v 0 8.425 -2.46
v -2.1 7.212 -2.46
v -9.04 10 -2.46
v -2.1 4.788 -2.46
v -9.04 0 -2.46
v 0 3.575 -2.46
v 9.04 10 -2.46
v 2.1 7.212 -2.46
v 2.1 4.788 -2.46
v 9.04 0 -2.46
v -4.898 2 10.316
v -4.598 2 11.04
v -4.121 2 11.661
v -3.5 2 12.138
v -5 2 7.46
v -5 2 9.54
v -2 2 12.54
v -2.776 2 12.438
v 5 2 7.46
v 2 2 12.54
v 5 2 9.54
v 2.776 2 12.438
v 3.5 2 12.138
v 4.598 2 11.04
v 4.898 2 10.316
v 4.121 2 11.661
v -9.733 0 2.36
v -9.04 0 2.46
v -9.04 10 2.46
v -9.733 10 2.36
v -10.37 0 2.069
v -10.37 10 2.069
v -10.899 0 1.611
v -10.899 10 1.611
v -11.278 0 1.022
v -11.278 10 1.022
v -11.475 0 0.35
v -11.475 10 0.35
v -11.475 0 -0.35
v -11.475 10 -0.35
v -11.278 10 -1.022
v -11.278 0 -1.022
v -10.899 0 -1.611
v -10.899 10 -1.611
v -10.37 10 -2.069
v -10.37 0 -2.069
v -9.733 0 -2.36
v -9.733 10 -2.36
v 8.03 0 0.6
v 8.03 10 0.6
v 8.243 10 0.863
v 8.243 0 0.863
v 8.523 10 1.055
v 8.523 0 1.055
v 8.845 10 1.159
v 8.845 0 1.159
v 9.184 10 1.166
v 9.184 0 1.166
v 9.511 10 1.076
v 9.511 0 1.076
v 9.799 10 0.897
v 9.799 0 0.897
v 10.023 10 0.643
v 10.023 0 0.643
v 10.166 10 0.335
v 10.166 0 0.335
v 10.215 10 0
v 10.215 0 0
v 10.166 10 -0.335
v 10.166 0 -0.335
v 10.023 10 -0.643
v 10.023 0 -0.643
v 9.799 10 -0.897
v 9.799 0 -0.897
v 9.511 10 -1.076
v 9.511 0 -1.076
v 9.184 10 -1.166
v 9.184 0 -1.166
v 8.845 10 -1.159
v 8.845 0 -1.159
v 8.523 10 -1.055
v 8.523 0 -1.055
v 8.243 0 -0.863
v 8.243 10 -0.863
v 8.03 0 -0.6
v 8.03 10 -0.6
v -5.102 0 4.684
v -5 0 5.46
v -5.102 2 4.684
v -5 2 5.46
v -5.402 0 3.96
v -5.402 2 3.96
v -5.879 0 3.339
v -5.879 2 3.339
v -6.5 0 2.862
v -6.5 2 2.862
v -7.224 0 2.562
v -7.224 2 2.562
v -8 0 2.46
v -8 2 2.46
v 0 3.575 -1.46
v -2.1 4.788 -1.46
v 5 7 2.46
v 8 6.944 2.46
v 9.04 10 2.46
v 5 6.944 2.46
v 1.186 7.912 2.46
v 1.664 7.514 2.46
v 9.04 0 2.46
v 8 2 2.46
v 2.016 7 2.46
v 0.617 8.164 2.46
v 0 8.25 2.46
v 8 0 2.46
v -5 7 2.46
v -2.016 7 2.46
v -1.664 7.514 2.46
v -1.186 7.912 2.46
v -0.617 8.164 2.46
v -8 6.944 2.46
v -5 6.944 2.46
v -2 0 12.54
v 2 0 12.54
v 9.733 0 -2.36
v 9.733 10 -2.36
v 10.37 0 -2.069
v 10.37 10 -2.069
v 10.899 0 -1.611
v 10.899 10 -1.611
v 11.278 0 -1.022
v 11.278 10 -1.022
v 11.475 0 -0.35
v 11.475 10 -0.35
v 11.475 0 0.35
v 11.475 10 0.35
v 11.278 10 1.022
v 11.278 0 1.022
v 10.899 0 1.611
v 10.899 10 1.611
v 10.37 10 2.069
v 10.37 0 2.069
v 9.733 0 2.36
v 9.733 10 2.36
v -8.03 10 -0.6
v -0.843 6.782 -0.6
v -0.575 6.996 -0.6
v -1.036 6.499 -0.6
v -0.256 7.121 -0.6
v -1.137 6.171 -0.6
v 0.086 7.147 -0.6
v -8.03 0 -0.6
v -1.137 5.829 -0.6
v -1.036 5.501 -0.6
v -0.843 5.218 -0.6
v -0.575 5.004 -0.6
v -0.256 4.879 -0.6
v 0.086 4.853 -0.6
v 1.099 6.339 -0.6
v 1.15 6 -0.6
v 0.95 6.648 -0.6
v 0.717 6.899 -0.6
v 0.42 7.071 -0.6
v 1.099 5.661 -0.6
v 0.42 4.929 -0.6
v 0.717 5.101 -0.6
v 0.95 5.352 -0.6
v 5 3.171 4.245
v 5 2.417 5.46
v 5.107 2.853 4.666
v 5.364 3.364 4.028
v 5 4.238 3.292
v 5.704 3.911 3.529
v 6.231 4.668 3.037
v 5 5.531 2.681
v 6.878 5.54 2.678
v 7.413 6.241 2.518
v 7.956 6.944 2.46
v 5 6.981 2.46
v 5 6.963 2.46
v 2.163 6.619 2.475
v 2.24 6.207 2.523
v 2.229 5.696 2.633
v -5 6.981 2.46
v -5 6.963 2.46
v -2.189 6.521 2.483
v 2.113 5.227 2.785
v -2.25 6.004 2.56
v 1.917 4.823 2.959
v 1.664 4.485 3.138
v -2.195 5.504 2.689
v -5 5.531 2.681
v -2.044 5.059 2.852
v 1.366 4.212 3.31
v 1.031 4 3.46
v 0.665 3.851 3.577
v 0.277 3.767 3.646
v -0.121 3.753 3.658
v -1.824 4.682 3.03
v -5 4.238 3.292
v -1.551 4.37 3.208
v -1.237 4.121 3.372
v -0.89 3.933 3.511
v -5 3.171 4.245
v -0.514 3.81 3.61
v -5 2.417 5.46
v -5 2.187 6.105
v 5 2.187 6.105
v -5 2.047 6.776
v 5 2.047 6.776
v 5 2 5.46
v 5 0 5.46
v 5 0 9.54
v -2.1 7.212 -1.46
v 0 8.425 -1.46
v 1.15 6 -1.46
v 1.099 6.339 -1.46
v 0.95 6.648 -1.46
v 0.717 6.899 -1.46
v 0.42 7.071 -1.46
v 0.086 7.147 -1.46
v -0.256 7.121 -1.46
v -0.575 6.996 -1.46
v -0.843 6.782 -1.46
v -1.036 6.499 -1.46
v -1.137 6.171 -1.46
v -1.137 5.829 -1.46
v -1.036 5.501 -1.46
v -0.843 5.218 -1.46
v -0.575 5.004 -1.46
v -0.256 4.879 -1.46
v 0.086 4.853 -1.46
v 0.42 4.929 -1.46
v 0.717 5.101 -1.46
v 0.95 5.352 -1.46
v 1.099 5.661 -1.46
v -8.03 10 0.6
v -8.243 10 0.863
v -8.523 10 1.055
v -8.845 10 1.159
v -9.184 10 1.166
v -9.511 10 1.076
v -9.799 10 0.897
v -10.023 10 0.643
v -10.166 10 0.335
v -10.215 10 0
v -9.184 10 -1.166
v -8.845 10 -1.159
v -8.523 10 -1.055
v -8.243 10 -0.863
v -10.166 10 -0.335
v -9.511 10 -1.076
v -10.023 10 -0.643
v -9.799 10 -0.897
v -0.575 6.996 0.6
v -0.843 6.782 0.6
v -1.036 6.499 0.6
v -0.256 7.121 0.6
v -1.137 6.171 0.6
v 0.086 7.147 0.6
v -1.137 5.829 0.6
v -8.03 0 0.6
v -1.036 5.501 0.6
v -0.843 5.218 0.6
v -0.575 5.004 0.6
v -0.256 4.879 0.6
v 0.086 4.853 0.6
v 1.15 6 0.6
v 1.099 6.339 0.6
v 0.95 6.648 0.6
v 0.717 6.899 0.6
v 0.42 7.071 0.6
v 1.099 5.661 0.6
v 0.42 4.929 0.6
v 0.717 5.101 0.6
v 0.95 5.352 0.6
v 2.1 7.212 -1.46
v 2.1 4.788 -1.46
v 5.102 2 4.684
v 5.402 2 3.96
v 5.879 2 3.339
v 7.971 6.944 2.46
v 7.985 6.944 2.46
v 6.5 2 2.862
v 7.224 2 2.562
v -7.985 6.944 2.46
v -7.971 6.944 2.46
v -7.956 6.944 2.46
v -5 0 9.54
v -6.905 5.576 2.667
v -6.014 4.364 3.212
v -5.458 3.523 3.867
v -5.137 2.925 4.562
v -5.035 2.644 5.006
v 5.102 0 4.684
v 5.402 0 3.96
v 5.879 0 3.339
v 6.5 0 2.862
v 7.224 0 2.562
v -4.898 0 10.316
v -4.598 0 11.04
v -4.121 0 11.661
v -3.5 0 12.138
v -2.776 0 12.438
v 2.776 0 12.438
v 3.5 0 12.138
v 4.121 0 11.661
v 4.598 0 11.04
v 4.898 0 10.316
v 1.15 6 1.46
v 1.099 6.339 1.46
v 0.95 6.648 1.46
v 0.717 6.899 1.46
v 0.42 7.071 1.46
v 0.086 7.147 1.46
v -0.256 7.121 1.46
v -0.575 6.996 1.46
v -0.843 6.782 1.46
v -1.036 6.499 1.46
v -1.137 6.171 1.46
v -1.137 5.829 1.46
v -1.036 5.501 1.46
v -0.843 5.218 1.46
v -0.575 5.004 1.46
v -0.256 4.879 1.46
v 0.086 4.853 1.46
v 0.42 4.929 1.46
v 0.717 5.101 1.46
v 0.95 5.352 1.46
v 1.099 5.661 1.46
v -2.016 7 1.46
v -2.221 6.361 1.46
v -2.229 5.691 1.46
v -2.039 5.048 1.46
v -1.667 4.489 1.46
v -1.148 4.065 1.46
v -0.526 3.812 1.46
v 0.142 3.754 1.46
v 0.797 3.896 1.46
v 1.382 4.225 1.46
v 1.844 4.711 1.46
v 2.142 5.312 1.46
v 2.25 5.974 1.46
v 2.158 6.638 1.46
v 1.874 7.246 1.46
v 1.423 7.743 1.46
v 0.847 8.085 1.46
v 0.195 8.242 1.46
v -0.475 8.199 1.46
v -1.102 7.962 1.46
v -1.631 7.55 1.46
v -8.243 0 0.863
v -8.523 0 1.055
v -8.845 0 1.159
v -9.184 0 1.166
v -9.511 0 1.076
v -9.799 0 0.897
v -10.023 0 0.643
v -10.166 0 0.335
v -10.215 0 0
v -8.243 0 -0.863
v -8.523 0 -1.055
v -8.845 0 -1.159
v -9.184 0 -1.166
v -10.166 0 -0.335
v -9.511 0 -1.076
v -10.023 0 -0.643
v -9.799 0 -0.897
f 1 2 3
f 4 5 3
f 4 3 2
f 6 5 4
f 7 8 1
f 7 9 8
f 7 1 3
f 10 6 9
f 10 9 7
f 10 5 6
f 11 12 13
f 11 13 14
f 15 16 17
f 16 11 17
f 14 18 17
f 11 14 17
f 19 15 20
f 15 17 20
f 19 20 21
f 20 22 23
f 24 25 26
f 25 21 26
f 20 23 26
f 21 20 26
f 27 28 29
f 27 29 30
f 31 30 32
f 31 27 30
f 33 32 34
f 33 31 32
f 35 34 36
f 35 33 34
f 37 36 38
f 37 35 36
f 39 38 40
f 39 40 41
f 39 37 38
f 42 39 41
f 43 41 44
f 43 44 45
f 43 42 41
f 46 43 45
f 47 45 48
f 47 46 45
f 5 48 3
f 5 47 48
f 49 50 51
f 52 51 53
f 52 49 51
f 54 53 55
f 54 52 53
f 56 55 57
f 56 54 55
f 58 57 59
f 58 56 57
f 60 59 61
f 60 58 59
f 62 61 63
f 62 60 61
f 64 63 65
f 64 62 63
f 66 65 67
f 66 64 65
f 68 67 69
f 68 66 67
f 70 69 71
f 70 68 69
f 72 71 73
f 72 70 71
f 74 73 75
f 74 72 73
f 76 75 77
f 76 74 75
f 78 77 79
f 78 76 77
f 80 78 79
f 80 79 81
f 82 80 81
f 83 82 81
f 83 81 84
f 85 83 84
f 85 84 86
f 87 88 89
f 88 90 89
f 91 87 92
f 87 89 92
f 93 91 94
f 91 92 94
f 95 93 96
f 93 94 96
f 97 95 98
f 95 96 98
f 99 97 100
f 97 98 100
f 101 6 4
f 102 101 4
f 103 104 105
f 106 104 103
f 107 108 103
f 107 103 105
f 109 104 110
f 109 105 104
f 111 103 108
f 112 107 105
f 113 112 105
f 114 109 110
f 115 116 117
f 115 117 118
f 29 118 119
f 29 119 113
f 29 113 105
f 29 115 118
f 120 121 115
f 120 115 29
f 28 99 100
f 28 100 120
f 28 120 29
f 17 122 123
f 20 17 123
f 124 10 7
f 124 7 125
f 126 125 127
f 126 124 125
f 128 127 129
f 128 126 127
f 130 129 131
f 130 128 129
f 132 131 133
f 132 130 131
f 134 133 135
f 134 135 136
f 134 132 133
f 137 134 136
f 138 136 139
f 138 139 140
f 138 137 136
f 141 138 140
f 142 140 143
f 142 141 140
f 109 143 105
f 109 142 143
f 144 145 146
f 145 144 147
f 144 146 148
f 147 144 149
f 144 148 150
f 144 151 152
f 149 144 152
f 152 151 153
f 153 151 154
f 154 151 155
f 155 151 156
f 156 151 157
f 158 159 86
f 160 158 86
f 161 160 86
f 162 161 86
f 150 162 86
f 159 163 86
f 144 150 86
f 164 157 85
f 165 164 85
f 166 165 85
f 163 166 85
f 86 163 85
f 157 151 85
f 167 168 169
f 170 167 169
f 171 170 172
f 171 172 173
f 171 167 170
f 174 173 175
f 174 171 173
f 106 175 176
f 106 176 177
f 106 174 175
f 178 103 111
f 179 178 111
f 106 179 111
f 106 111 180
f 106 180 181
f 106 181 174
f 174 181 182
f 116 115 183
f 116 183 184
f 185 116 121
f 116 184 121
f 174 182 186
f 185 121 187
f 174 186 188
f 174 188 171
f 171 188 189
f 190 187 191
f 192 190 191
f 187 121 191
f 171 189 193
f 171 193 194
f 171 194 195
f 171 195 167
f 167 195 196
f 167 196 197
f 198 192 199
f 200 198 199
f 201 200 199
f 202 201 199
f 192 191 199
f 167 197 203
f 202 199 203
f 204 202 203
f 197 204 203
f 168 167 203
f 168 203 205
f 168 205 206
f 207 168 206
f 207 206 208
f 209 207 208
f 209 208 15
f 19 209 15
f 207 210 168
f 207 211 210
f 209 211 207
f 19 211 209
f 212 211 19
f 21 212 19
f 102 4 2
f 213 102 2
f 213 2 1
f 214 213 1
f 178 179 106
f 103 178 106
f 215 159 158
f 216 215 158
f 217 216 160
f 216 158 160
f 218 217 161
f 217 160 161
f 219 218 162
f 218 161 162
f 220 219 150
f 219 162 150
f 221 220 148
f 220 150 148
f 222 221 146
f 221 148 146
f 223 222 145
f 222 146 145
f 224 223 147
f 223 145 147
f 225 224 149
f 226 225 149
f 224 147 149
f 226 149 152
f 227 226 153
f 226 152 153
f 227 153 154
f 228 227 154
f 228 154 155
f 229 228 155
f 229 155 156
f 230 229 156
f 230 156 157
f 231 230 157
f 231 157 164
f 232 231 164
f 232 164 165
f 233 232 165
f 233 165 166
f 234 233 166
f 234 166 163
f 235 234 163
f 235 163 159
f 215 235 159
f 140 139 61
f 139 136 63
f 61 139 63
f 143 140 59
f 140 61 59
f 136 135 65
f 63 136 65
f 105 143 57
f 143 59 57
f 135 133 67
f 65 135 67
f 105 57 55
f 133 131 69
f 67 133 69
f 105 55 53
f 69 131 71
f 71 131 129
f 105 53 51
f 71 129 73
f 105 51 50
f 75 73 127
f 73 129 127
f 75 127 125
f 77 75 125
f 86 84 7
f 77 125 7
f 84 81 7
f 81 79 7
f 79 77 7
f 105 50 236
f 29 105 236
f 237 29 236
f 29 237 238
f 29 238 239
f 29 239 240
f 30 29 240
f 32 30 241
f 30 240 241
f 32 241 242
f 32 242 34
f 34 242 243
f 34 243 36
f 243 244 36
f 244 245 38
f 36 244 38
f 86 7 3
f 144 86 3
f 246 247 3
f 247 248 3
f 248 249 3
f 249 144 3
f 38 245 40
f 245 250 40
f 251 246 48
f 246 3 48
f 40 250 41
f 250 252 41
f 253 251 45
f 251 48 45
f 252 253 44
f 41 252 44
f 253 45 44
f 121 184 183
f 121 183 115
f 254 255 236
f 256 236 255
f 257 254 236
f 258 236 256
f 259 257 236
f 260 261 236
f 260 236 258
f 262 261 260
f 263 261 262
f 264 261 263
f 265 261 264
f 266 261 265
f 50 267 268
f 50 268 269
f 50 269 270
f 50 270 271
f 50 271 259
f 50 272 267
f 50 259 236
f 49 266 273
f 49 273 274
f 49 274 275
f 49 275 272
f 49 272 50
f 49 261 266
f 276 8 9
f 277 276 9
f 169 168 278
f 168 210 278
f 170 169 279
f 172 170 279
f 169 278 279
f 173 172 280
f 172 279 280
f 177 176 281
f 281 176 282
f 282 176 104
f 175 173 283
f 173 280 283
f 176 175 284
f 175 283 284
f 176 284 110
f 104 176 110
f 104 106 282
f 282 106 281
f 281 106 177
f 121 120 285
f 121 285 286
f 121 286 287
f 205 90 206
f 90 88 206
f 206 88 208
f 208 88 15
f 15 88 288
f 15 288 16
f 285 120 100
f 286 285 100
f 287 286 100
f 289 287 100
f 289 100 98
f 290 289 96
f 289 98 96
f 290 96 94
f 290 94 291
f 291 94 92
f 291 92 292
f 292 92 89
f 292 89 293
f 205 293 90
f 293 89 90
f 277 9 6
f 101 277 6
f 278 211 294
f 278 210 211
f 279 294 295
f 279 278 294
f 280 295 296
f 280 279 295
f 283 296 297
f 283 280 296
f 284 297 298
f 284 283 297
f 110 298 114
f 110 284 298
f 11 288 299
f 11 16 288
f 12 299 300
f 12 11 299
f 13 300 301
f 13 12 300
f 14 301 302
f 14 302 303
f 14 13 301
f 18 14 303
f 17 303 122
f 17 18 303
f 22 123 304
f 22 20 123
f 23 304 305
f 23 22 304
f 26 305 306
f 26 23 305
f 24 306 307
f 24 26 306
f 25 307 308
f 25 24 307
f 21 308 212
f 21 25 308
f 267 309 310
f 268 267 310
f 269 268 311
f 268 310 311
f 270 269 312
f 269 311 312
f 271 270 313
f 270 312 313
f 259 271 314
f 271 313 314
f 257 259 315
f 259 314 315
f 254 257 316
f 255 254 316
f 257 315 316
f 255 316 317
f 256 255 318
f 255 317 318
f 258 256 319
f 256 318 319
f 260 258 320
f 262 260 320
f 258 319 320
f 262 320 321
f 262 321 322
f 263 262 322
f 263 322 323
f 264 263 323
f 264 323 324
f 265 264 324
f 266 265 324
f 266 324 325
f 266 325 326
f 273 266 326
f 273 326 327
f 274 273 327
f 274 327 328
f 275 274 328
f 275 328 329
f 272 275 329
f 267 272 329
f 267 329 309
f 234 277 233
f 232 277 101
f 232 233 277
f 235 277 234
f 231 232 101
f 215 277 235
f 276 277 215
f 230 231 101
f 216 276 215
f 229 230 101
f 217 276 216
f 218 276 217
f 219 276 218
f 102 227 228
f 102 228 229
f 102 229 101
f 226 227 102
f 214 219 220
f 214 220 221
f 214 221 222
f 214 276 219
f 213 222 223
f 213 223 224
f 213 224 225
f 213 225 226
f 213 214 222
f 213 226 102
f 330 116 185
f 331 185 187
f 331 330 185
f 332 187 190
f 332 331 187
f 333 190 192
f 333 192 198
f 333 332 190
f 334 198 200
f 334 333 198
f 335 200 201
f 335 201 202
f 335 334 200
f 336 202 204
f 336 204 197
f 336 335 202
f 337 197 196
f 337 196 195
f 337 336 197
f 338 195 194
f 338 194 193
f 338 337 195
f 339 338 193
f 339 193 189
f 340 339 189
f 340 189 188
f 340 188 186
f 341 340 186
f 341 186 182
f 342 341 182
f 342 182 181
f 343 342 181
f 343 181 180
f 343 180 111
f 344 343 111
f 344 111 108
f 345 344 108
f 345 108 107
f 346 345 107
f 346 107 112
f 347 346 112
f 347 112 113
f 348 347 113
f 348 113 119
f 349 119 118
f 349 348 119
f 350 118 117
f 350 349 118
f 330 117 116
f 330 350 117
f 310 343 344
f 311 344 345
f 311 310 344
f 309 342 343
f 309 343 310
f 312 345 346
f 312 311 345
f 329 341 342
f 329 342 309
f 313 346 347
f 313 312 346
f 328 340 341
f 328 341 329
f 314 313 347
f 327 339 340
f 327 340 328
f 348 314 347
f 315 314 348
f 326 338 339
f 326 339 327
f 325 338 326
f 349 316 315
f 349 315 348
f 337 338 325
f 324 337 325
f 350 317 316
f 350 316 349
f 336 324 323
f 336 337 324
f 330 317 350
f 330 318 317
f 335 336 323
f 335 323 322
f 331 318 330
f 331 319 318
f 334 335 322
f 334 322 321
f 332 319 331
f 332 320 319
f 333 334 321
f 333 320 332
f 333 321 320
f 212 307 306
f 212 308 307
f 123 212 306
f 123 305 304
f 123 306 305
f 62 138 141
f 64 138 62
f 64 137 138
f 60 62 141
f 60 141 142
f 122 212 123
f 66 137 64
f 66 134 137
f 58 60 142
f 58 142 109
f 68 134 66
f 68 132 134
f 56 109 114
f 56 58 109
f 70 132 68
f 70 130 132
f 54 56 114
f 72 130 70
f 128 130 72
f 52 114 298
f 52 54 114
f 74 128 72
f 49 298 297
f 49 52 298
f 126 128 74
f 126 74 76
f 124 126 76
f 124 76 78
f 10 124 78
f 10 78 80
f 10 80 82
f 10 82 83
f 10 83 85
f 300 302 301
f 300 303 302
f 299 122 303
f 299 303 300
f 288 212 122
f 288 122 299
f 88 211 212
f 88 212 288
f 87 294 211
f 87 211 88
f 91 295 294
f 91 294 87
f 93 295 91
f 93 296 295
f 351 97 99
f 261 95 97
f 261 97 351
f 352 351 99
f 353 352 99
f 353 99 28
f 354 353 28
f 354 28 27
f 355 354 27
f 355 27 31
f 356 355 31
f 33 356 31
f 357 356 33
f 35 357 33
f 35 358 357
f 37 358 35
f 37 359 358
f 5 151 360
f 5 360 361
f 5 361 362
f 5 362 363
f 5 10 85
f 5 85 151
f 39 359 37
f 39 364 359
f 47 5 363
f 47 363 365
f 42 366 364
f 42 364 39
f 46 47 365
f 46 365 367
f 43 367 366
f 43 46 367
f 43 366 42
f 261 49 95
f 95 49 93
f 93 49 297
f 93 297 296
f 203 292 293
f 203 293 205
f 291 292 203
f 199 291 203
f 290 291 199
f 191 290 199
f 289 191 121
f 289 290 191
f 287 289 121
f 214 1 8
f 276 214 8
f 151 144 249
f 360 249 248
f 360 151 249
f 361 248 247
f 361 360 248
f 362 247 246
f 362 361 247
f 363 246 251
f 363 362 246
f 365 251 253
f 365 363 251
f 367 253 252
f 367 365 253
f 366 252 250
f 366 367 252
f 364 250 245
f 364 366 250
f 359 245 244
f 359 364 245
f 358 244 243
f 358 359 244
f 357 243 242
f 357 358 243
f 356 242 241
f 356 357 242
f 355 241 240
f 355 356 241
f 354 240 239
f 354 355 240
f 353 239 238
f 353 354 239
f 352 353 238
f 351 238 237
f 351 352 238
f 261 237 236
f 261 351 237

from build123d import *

# Parameters (mm, degrees)
SKETCH_1_R               = 1.175
EXTRUDE_1_DEPTH          = 10
SKETCH_3_W               = 10
SKETCH_3_H               = 15
EXTRUDE_2_DEPTH          = 2
FILLET_2_R               = 3
FILLET_START             = -5
FILLET_3_DEPTH           = 10
FILLET_START_2           = 2
FILLET_3_2_DEPTH         = 4.9438
FILLET_START_3           = -9
FILLET_3_3_DEPTH         = 17
SKETCH_4_W               = 16.05948
SKETCH_4_H               = 1.2
CUT_EXTRUDE_2_DEPTH      = 20.735795
CUT_EXTRUDE_4_DEPTH      = 19.271738
CUT_EXTRUDE_4_DEPTH_BACK = 1
SKETCH_6_R               = 2.25
SKETCH_7_R               = 1.15
CUT_EXTRUDE_5_DEPTH      = 19.841879
CUT_EXTRUDE_6_DEPTH      = 1


with BuildPart() as part:
    # 草图1 → 凸台-拉伸1 (new body)
    with BuildSketch(Plane(origin=(0, 0, 0), x_dir=(1, 0, 0), z_dir=(0, 1, 0))):
        with BuildLine():
            Line((-9.04, 2.46), (9.04, 2.46))
            ThreePointArc((9.04, 2.46), (11.5, 0), (9.04, -2.46))
            Line((9.04, -2.46), (-9.04, -2.46))
            ThreePointArc((-9.04, -2.46), (-11.5, 0), (-9.04, 2.46))
        make_face()
        with Locations(Location((9.04, 0, 0), (0, 0, 270))):
            Circle(SKETCH_1_R, mode=Mode.SUBTRACT)
        with Locations(Location((-9.04, 0, 0), (0, 0, 90))):
            Circle(SKETCH_1_R, mode=Mode.SUBTRACT)
    extrude(amount=EXTRUDE_1_DEPTH)

    # 草图3 → 凸台-拉伸2 (add)
    with BuildSketch(Plane.XZ):
        with Locations((0, 5.04)):
            Rectangle(SKETCH_3_W, SKETCH_3_H)
    extrude(amount=-EXTRUDE_2_DEPTH)

    # 圆角2
    fillet_2_edges = [part.edges().sort_by_distance(p)[0] for p in [
        (5, 1, 12.54),
        (5, 1, 2.46),
        (-5, 1, 2.46),
        (-5, 1, 12.54),
    ]]
    fillet(fillet_2_edges, radius=FILLET_2_R)

    # 圆角3: read off the stored shape, not the designer's step
    # 圆角3 outline → 圆角3 (add)
    with BuildSketch(Plane.YZ.offset(FILLET_START)):
        with BuildLine():
            ThreePointArc((7, 2.46), (3.464466, 3.924466), (2, 7.46))
            Line((2, 7.46), (2, 2.46))
            Line((2, 2.46), (7, 2.46))
        make_face()
    extrude(amount=FILLET_3_DEPTH)

    # Fillet 3 2 outline → Fillet 3 2 (add)
    with BuildSketch(Plane(origin=(0, 0, 0), x_dir=(1, 0, 0), z_dir=(0, 1, 0)).offset(FILLET_START_2)):
        with BuildLine():
            Line((5, -2.46), (5, -5.46))
            ThreePointArc((5, -5.46), (5.87868, -3.33868), (8, -2.46))
            Line((8, -2.46), (5, -2.46))
        make_face()
        with BuildLine():
            Line((-5, -5.46), (-5, -2.46))
            Line((-5, -2.46), (-8, -2.46))
            ThreePointArc((-8, -2.46), (-5.87868, -3.33868), (-5, -5.46))
        make_face()
    extrude(amount=FILLET_3_2_DEPTH)

    # Fillet 3 3 outline → Fillet 3 3 (cut)
    with BuildSketch(Plane.YZ.offset(FILLET_START_3)):
        with BuildLine():
            Line((8, 7), (2.021205, 7))
            ThreePointArc((2.021205, 7), (3.610313, 3.784402), (6.9438, 2.460316))
            ThreePointArc((6.9438, 2.460316), (6.9719, 2.460079), (7, 2.46))
            Line((7, 2.46), (8, 2.46))
            Line((8, 2.46), (8, 7))
        make_face()
    extrude(amount=FILLET_3_3_DEPTH, mode=Mode.SUBTRACT)

    # 草图4 → 切除-拉伸2 (cut, through all)
    with BuildSketch(Plane.XZ):
        Rectangle(SKETCH_4_W, SKETCH_4_H)
    extrude(amount=-CUT_EXTRUDE_2_DEPTH, mode=Mode.SUBTRACT)

    # 草图6 → 切除-拉伸4 (cut, two sides: drawn at the far end of the back side and taken through both)
    with BuildSketch(Plane.XY.offset(2.46).offset(-CUT_EXTRUDE_4_DEPTH_BACK)):
        with Locations(Location((0, 6, 0), (0, 0, 153.6122))):
            Circle(SKETCH_6_R)
    extrude(amount=CUT_EXTRUDE_4_DEPTH + CUT_EXTRUDE_4_DEPTH_BACK, mode=Mode.SUBTRACT)

    # 草图7 → 切除-拉伸5 (cut, through all)
    with BuildSketch(Plane.XY.offset(1.46)):
        with Locations((0, 6)):
            Circle(SKETCH_7_R)
    extrude(amount=-CUT_EXTRUDE_5_DEPTH, mode=Mode.SUBTRACT)

    # 草图8 → 切除-拉伸6 (cut)
    with BuildSketch(Plane(origin=(0, 0, -2.46), x_dir=(-1, 0, 0), z_dir=(0, 0, -1))):
        Polygon((0, 8.424871), (-2.1, 7.212436), (-2.1, 4.787564), (0, 3.575129), (2.1, 4.787564), (2.1, 7.212436), align=None)
    extrude(amount=-CUT_EXTRUDE_6_DEPTH, mode=Mode.SUBTRACT)


solid = part.part
